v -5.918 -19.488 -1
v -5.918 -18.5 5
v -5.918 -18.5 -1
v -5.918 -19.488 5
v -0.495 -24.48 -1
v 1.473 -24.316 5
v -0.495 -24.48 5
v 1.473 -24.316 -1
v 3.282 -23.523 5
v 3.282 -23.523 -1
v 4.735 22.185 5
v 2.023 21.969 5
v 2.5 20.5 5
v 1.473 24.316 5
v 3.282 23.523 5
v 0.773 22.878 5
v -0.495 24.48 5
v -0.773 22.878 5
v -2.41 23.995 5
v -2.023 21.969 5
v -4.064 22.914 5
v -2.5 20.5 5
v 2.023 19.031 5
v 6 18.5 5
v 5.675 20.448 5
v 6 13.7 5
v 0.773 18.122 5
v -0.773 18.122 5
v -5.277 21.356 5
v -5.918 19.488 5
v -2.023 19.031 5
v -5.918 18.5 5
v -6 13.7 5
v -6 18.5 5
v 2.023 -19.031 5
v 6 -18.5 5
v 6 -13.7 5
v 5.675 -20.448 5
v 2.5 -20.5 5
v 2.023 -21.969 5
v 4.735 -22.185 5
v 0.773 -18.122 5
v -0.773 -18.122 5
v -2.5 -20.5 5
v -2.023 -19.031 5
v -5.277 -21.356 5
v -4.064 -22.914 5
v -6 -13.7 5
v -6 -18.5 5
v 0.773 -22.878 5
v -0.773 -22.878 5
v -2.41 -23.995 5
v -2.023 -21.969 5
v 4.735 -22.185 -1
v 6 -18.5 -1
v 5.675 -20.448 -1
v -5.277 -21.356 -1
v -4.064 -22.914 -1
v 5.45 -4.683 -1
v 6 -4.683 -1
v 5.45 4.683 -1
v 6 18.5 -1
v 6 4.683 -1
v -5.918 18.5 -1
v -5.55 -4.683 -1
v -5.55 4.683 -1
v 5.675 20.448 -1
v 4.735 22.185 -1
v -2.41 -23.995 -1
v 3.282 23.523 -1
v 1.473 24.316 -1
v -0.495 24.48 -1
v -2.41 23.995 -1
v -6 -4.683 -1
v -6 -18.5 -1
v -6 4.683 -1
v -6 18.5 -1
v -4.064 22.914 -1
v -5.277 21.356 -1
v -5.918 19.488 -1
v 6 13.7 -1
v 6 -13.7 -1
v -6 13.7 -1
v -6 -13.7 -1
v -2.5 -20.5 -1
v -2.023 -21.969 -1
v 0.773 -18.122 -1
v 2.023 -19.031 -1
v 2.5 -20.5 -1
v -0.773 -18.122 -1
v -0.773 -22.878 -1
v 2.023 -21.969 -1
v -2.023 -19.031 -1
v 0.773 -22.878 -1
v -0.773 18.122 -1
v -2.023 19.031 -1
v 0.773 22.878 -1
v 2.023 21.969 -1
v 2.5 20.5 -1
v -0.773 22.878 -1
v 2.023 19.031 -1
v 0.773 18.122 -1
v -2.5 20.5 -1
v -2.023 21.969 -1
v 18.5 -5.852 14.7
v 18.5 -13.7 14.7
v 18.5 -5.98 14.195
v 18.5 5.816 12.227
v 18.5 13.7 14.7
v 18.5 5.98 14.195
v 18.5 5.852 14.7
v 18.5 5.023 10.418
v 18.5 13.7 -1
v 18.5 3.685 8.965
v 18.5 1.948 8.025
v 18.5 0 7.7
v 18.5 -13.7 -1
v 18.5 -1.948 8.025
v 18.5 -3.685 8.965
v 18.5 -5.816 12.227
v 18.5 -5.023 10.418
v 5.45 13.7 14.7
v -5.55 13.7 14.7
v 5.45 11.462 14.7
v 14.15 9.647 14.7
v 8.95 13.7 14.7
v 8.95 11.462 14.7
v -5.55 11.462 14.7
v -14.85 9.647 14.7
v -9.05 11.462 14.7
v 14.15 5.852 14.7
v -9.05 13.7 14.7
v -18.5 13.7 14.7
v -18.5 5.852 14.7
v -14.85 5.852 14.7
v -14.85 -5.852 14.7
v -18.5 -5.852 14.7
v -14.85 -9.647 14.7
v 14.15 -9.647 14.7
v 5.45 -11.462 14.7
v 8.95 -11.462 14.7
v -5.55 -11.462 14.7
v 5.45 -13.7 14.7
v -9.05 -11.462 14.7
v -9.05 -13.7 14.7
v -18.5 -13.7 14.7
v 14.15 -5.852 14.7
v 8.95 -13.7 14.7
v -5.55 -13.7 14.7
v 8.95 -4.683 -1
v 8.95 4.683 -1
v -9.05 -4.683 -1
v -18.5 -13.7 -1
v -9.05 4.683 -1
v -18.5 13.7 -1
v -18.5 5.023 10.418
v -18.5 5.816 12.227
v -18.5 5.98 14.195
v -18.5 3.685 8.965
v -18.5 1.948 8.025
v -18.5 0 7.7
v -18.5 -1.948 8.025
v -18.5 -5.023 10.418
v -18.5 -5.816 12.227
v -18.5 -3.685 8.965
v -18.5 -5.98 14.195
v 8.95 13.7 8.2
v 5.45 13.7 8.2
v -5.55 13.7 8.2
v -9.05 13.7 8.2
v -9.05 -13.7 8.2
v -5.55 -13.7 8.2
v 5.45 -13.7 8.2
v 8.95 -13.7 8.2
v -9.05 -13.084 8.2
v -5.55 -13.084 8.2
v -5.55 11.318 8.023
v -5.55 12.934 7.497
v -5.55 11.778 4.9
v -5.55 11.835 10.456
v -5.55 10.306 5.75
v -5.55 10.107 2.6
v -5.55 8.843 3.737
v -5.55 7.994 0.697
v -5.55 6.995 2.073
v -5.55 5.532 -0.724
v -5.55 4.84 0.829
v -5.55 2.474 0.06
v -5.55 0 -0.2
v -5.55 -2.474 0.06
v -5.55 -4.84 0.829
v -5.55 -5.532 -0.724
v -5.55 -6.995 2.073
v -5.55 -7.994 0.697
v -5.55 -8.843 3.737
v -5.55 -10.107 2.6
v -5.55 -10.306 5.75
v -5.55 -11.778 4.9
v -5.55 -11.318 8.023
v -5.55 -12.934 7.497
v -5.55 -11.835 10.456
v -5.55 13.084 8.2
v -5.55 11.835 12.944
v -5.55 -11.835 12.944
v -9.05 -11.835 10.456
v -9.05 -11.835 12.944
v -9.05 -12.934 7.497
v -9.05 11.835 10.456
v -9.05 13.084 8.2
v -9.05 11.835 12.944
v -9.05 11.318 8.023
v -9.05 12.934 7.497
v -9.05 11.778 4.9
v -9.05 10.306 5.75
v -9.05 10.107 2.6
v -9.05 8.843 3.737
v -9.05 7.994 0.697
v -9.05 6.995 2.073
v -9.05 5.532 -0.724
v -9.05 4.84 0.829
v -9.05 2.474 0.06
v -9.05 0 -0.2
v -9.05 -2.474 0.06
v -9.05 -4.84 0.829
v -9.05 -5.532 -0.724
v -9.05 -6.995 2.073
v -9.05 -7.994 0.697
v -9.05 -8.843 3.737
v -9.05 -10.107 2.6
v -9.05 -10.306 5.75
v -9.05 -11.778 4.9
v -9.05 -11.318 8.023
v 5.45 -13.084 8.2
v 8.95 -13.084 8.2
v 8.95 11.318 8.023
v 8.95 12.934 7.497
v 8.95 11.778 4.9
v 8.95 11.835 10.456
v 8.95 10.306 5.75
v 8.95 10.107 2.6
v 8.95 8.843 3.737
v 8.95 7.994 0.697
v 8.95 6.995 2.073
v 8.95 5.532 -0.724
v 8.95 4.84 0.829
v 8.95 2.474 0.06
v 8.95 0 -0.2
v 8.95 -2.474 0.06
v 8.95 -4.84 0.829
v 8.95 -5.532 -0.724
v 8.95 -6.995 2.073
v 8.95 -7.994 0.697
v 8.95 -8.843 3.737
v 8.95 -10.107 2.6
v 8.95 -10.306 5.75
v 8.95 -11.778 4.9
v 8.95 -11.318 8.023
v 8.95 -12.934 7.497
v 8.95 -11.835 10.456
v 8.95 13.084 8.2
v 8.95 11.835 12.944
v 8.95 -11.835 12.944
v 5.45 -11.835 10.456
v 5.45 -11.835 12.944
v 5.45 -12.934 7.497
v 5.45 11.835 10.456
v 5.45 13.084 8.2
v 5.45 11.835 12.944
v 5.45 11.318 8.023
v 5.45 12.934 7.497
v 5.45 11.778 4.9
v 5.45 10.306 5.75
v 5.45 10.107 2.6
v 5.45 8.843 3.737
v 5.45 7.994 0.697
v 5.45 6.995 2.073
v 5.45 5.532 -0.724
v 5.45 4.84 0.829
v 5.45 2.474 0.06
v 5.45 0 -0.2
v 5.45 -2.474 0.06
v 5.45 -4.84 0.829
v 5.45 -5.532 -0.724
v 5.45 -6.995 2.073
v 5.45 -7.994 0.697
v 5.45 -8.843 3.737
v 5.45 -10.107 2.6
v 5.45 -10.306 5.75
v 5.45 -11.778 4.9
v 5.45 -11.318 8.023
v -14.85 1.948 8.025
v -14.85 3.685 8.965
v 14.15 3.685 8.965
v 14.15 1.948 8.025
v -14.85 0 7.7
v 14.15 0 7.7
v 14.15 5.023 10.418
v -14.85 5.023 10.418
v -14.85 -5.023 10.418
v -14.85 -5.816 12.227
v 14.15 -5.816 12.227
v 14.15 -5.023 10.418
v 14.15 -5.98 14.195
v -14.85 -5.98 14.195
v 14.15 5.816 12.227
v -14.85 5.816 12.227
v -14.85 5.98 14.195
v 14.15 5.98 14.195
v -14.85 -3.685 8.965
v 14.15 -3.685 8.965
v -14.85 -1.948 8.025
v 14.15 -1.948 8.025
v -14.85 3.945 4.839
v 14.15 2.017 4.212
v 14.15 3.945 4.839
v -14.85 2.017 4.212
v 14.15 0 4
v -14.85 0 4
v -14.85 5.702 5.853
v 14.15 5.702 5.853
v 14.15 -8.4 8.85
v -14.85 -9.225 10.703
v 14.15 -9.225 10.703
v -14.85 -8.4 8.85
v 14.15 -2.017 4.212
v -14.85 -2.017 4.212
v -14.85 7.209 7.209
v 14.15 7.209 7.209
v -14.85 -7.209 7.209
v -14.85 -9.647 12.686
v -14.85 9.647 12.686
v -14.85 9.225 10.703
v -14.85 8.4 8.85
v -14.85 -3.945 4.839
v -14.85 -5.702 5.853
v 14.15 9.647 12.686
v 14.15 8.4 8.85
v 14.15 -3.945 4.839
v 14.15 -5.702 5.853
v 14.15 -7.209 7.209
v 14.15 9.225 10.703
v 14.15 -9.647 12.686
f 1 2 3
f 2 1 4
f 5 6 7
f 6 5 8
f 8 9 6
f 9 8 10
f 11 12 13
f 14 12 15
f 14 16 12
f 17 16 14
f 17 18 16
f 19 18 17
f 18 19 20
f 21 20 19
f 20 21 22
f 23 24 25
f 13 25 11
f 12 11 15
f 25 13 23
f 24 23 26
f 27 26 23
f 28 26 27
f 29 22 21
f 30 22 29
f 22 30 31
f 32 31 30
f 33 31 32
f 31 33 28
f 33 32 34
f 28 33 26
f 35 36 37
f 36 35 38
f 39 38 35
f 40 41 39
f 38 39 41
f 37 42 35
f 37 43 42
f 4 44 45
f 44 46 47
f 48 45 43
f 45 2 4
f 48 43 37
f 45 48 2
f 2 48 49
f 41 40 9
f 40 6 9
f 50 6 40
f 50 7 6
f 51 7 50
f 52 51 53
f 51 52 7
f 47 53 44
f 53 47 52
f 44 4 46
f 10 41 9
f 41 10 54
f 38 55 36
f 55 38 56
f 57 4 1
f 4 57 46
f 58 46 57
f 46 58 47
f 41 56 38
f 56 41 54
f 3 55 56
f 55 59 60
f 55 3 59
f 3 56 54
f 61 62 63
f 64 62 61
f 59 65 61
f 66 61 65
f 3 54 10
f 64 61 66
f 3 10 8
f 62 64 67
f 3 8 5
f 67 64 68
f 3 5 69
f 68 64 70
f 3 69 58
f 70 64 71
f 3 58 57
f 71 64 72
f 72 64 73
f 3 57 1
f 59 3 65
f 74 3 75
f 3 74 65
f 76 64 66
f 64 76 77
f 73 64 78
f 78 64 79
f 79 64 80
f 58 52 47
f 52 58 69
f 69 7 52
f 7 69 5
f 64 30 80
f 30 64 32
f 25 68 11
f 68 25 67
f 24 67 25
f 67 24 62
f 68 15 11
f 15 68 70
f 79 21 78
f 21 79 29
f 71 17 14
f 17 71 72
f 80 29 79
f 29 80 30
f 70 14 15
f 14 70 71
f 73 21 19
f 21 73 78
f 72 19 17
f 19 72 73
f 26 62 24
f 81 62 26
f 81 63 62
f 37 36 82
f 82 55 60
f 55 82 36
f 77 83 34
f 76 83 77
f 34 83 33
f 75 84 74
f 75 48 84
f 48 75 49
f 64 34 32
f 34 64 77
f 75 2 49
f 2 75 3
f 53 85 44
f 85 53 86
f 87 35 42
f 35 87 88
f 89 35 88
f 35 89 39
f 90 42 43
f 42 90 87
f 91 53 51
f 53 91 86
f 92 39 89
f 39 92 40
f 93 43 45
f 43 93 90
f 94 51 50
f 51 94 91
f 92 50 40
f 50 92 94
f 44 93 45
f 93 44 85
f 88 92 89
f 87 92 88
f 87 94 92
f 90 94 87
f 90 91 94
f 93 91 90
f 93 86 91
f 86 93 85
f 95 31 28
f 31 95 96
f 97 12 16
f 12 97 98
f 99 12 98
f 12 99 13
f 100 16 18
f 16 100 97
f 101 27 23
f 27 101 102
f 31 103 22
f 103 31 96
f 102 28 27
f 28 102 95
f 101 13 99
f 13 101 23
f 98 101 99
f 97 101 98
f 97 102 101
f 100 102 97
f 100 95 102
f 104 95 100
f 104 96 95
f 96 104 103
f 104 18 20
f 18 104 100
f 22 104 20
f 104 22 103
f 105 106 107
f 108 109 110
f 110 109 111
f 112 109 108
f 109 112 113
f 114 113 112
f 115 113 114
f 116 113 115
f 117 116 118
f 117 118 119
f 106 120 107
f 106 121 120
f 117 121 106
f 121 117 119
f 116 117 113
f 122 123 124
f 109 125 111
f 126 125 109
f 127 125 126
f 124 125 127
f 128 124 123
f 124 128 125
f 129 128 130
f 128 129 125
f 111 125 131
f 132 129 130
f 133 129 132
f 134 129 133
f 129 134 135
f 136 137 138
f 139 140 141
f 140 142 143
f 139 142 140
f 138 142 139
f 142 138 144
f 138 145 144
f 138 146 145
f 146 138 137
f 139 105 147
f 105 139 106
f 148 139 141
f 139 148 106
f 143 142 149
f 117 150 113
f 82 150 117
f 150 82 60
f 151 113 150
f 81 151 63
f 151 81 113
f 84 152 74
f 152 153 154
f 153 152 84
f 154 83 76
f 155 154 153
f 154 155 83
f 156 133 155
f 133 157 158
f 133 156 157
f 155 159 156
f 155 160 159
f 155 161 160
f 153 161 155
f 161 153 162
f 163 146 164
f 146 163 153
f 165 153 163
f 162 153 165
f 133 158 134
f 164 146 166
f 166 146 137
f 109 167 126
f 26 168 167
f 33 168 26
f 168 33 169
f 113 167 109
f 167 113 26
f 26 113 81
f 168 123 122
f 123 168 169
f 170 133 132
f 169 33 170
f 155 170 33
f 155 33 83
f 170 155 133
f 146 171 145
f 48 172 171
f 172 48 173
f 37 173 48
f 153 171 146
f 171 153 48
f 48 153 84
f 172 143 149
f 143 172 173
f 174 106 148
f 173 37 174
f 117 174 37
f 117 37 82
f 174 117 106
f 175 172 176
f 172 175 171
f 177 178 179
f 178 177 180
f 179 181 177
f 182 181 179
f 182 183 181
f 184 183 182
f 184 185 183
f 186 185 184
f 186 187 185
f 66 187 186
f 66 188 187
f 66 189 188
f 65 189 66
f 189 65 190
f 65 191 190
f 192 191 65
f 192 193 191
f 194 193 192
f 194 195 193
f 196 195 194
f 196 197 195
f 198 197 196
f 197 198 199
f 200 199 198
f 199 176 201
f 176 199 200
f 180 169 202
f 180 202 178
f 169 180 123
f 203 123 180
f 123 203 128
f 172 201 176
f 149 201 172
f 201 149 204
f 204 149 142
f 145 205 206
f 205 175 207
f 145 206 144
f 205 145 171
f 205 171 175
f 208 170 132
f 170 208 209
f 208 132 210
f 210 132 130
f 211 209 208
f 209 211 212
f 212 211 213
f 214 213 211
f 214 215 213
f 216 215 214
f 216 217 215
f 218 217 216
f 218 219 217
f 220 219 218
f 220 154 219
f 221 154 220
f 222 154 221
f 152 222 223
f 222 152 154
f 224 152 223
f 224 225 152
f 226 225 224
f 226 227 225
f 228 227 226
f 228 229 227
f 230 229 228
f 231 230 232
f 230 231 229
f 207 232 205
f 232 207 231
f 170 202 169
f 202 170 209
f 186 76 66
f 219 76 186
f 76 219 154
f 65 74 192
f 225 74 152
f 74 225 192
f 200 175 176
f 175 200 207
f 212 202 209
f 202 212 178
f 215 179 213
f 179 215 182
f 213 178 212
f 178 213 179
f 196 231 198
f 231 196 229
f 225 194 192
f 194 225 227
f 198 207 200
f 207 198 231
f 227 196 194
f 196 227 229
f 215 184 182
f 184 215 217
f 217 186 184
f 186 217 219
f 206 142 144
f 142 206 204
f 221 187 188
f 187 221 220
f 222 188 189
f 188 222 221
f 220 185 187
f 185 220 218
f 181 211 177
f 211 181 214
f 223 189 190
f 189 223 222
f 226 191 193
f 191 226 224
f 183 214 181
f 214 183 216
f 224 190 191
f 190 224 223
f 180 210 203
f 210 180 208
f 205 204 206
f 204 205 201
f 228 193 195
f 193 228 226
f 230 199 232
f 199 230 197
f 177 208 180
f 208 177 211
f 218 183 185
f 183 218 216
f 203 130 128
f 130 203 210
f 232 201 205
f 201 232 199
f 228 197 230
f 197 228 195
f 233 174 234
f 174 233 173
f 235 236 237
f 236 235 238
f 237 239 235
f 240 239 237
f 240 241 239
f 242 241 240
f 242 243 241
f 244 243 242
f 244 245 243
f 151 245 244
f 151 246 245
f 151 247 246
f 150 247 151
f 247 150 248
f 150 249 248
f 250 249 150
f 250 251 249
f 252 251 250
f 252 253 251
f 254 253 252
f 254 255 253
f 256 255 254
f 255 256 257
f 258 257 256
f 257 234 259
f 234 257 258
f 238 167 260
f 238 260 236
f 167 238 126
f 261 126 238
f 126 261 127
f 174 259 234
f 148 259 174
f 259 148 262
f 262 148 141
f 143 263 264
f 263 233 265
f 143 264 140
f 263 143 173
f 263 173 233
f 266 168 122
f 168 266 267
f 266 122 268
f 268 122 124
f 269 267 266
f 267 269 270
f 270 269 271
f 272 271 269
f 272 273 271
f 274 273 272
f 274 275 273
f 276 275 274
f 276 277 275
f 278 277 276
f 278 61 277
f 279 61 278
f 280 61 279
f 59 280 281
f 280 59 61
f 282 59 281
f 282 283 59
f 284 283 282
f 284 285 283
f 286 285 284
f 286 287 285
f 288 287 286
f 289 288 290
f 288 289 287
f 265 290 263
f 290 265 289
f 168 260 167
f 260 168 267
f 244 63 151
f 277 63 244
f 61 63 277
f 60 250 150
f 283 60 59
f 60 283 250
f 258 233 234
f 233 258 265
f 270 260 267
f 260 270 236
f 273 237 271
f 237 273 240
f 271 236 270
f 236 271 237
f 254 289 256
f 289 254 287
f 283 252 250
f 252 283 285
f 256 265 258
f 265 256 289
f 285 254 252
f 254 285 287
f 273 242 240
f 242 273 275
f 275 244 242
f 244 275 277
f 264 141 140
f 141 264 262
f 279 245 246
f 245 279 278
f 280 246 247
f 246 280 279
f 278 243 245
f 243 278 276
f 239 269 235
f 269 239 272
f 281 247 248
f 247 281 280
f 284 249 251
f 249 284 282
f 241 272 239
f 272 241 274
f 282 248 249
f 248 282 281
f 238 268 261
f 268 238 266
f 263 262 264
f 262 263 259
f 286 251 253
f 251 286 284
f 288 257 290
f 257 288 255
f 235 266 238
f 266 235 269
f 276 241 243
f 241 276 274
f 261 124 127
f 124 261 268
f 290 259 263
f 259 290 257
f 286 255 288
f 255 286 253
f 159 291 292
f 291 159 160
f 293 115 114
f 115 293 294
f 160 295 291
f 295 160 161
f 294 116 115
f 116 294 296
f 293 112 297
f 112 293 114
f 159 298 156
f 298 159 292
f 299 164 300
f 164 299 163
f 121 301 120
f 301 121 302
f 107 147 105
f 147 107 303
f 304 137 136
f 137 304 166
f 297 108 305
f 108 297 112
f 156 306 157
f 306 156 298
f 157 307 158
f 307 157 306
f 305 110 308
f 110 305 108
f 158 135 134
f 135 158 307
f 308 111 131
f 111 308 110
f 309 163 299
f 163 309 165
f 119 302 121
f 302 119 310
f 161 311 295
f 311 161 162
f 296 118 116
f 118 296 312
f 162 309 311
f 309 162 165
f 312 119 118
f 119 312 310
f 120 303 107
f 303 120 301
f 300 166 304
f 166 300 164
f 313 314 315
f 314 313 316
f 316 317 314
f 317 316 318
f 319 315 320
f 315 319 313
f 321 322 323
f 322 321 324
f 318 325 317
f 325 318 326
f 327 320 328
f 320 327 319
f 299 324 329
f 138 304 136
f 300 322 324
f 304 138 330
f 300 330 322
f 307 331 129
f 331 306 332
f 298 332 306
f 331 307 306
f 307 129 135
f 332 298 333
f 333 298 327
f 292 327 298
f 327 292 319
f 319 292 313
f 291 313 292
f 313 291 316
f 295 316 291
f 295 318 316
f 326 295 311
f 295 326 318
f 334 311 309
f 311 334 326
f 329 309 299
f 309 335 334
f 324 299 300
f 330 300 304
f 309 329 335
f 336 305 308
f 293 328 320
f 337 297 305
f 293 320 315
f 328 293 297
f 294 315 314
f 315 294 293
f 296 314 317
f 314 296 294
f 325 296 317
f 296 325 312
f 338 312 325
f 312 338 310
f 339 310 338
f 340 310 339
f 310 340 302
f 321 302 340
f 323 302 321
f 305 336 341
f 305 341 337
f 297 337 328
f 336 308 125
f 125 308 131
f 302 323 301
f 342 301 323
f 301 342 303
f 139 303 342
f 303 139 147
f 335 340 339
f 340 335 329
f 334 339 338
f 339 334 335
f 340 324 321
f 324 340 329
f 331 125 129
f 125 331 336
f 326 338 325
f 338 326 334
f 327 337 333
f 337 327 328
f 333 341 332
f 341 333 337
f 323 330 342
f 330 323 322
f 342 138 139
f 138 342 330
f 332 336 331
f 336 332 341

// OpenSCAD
// LM8UU holder module, zip tie model
// Yes, another one
// John Ridley
// September 3 2012

LM8UU_dia = 19.4; 
LM8UU_length = 29;
LM8UU_rod_dia = 12;
LM8UU_body_wall_thickness = 4;
// set up all this junk as globals for compatibility with some other objects



///////////////////////////////////////////////////////////////////////////////////////////
// use this to create a bare holder (change false to true)
if (true)
{
 LM8UU_holder(
 	tab_length = 9.6,
 	tab_width = 12,
 	tab_screw_dia = 5);
}
///////////////////////////////////////////////////////////////////////////////////////////

module LM8UU_holder(
	bearing_dia = LM8UU_dia, 
	bearing_len = LM8UU_length, 
	shaft_dia = LM8UU_rod_dia, 
	border = LM8UU_body_wall_thickness, 
	borderP = LM8UU_body_wall_thickness + 2,
	zip_width = 3.5,
	zip_height = 1.5,
	tab_length = 0, 
	tab_width = 0, 
	tab_screw_dia = 0)
{
	;
	
	//screw/nut dimensions (M3) - hexagon socket head cap screw ISO 4762, hexagon nut ISO 4032
	screw_thread_dia_iso = 3.5;
	screw_head_dia_iso = 6.5;
	nut_wrench_size_iso = 7.95;
	
	
	// screw/nut dimensions for use (plus clearance for fitting purpose)
	clearance_dia = 0.5;
	screw_thread_dia = screw_thread_dia_iso + clearance_dia;
	screw_head_dia = screw_head_dia_iso + clearance_dia;
	nut_wrench_size = nut_wrench_size_iso + clearance_dia;
	nut_dia_perimeter = (nut_wrench_size/cos(30));
	nut_dia = nut_dia_perimeter;
	nut_surround_thickness = 2;
	
	// main body dimensions
	body_width = LM8UU_dia + (2*LM8UU_body_wall_thickness);
	body_height = LM8UU_dia/2 + LM8UU_body_wall_thickness;
	body_length = LM8UU_length + (2*LM8UU_body_wall_thickness);
	zip_offset = 2;

	translate([0,0,(bearing_dia/2+border)/2])
	difference()
	{
		union ()
		{
			cube([bearing_len + border*2, bearing_dia + border*2, bearing_dia/2 + borderP], center = true);
			if (tab_length > 0)
			{
				difference()
				{
					translate([0,0,-(bearing_dia/2)/2])
					{
						union ()
						{
							//soporte de los agujeros (base)
							cube([tab_width, tab_length + bearing_dia + border*2, borderP], center=true);

							for (i=[-1,1])
							{
								//Cilindros externos
								translate([0,(bearing_dia/2 + border + tab_length/2)*i, -borderP/2])
									cylinder(r=tab_width/2, h=borderP);
							}
						}
					}

					for (i=[-1,1])
					{
						//cilindros internos ( agujeros)
						translate([0,(bearing_dia/2 + borderP + tab_length/2)*i, -(bearing_dia/2 + borderP)/2])
							cylinder(r=tab_screw_dia / 2, h=borderP+0.1, $fn=10);
					}
				}
			}
		}
		translate([-(bearing_len/2 + border+0.05), 0, (bearing_dia/2+border)/2])
		rotate([0,90,0])
		union()
		{
			cylinder(r=shaft_dia/2, h=bearing_len + border*2+0.1);
			translate([0,0,(bearing_dia - shaft_dia)/2])
			cylinder(r=bearing_dia/2, h=bearing_len);

			// zip tie channels
			for (i=[-1,1])
			{
				translate([0,0,bearing_len/2+border-zip_width/2 + bearing_len/4 * i])
				{
					/*translate([(bearing_dia/2+border-zip_height/2+0.1), 0, zip_width/2])
						cube([zip_height, 12, zip_width], center=true);*/
					for (j=[-1,1])
					{
						translate([0,j*(bearing_dia/2+border-zip_height/2), zip_width/2])
							cube([11,zip_height, zip_width], center=true);
					}
					translate([zip_offset,0,0])// bearing_len/2 + border])
					difference ()
					{
						cylinder(r=bearing_dia/2 + border-0.1, h=zip_width);
						cylinder(r=bearing_dia/2 + border-0.3 - zip_height, h=zip_width);
					}
				}
			}
		}
	}
}
